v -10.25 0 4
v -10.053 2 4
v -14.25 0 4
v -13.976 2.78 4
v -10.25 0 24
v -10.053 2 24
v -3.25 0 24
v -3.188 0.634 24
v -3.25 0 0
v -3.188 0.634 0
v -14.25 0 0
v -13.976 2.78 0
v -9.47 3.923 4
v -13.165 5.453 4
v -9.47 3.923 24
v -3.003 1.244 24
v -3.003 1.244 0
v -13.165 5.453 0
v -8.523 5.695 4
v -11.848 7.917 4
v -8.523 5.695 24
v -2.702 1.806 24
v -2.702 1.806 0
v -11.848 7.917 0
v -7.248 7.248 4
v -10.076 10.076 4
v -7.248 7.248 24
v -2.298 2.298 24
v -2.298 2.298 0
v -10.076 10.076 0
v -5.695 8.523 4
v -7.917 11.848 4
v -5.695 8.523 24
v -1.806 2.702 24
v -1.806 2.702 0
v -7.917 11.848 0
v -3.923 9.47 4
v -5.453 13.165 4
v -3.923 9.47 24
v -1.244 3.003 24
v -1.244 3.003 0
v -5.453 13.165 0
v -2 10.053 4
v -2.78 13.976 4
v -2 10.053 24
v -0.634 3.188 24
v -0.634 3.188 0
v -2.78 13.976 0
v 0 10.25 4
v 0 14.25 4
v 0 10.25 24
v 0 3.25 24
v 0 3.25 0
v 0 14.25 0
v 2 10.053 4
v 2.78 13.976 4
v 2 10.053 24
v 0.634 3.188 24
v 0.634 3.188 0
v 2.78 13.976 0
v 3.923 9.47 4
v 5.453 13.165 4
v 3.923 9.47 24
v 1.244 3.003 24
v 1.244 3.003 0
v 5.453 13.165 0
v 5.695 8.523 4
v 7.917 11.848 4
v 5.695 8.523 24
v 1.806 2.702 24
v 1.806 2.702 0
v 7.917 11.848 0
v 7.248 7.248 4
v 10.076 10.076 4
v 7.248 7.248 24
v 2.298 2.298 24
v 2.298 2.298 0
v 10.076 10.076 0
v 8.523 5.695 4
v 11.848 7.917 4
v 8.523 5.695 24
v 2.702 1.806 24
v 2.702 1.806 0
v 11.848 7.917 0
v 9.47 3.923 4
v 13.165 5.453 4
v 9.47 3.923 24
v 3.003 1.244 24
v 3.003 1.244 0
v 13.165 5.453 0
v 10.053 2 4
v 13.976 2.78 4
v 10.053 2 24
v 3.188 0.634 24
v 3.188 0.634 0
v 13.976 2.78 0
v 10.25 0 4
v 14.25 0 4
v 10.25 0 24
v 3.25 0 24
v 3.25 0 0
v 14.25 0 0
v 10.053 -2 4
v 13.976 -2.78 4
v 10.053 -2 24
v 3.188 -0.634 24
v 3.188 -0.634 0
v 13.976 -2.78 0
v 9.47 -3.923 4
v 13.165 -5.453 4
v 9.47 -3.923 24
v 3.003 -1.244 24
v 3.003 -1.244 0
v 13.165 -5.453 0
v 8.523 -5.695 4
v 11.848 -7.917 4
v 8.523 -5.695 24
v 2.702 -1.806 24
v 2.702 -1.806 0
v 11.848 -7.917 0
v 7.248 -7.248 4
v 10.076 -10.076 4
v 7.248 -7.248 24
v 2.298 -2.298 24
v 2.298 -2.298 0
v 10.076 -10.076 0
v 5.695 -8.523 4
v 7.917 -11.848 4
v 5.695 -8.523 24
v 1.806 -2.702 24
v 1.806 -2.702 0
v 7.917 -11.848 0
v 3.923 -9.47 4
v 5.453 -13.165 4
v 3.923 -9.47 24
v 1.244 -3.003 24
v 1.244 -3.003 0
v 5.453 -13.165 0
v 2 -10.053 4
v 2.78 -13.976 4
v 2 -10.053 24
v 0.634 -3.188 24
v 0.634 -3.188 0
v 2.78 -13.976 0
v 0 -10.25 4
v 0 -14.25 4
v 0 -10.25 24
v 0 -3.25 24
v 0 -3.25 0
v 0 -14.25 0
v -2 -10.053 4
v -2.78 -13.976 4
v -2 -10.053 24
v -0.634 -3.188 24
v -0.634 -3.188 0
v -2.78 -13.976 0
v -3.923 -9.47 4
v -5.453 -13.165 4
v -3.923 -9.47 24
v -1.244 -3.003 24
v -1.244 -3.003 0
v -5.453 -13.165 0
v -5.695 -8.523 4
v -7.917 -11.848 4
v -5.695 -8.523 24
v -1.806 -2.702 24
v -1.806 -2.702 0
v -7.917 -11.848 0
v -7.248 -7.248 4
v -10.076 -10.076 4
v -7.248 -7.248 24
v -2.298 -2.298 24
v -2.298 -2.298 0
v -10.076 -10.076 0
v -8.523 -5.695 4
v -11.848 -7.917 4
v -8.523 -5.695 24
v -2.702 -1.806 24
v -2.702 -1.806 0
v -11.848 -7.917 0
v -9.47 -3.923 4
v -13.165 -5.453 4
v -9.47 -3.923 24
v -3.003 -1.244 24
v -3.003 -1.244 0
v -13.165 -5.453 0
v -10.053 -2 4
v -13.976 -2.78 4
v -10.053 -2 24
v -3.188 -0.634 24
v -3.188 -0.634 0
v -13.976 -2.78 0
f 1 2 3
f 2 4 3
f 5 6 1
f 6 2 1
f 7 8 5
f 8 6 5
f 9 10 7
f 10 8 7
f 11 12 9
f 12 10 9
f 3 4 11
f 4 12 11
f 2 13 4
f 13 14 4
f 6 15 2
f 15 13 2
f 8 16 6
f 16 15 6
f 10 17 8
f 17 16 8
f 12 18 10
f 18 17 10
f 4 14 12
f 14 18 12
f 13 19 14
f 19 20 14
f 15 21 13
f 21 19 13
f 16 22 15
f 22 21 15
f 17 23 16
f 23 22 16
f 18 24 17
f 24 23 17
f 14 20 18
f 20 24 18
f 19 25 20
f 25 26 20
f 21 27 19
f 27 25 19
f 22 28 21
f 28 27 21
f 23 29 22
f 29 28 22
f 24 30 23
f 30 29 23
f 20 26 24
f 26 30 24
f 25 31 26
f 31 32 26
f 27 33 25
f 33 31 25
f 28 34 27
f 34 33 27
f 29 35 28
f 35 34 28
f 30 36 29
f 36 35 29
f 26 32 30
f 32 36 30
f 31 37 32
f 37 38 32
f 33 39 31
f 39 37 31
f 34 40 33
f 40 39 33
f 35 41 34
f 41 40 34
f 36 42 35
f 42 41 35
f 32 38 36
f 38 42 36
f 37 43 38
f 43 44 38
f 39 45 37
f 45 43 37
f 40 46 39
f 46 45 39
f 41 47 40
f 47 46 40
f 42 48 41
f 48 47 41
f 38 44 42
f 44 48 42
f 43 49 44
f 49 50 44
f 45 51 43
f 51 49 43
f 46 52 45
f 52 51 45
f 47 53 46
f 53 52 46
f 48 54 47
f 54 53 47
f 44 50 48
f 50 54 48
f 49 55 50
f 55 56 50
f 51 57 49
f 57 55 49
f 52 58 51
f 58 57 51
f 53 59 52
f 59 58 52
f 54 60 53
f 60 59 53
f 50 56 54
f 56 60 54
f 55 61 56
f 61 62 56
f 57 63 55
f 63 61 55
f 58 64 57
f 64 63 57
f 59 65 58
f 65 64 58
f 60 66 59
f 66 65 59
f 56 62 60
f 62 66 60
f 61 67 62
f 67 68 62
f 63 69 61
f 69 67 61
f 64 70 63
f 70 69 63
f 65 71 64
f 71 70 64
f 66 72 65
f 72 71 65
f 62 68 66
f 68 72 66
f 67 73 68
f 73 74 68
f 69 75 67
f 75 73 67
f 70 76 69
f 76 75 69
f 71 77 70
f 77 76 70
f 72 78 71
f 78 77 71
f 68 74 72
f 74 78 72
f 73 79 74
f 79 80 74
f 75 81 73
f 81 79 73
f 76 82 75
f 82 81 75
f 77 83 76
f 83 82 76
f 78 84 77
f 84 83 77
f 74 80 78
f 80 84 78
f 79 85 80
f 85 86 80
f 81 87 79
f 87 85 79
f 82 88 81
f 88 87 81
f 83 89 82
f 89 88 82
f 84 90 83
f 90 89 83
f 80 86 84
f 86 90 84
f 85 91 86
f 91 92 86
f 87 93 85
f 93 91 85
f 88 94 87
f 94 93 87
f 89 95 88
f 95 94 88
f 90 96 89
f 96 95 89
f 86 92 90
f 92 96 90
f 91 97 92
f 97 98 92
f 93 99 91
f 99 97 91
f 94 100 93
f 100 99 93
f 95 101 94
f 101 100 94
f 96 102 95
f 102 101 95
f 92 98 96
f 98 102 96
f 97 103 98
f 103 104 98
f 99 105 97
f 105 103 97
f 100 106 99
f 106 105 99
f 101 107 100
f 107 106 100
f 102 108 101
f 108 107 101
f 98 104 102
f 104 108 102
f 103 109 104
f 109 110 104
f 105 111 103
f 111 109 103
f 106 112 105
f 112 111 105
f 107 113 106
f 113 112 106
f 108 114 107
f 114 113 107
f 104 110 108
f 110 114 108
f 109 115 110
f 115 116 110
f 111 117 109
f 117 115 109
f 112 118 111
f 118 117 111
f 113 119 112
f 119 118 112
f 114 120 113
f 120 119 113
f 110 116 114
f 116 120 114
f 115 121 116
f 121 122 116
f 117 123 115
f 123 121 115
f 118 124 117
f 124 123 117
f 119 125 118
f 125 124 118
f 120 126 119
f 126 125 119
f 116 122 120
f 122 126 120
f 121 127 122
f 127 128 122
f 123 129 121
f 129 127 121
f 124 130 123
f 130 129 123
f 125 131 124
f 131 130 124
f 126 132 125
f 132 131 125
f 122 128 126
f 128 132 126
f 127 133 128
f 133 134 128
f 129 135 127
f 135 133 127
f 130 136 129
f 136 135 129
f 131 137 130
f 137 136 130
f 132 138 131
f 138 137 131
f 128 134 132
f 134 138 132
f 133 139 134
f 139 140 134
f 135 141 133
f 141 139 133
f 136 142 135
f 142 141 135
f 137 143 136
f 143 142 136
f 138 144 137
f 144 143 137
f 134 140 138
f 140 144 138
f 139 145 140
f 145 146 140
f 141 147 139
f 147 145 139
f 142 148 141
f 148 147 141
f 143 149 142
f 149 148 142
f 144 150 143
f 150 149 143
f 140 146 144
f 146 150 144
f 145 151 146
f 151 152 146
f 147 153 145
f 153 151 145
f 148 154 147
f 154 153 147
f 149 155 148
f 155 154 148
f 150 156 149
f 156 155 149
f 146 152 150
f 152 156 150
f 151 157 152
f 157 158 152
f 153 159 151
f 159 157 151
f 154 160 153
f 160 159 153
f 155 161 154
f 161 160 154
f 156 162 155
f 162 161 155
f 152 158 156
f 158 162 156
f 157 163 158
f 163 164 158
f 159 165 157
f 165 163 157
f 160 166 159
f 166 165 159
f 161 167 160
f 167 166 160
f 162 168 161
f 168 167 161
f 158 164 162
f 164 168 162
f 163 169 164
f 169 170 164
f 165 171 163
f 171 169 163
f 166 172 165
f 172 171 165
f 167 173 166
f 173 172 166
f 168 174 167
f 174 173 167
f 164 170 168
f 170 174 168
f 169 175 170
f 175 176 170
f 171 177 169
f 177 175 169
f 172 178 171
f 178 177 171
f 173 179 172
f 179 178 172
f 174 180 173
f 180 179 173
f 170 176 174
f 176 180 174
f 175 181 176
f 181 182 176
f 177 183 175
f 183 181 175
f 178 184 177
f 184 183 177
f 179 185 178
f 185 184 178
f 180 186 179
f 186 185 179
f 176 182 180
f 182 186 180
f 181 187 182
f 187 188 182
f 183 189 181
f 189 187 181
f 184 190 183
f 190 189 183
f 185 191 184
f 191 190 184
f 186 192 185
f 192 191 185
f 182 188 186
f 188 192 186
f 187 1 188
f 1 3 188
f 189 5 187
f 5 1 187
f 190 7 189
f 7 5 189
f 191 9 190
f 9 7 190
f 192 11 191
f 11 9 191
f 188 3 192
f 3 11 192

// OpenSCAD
$fn = 32;
// ----------------------------------------------------------------------
// Profiled standoff: flanged spacer, 24 mm long, bore 6.5 mm
// ----------------------------------------------------------------------

// --- parameters (mm) ---
revolve_angle = 360;      // full turn around the Z axis
profile_points = 6;       // points of the closed outline

profile = [[3.25, 0], [14.25, 0], [14.25, 4], [10.25, 4], [10.25, 24], [3.25, 24]];  // single closed polygon, 6 points, counter clockwise

// --- the one profile operation ---
rotate_extrude(angle = revolve_angle) polygon(points = profile);
